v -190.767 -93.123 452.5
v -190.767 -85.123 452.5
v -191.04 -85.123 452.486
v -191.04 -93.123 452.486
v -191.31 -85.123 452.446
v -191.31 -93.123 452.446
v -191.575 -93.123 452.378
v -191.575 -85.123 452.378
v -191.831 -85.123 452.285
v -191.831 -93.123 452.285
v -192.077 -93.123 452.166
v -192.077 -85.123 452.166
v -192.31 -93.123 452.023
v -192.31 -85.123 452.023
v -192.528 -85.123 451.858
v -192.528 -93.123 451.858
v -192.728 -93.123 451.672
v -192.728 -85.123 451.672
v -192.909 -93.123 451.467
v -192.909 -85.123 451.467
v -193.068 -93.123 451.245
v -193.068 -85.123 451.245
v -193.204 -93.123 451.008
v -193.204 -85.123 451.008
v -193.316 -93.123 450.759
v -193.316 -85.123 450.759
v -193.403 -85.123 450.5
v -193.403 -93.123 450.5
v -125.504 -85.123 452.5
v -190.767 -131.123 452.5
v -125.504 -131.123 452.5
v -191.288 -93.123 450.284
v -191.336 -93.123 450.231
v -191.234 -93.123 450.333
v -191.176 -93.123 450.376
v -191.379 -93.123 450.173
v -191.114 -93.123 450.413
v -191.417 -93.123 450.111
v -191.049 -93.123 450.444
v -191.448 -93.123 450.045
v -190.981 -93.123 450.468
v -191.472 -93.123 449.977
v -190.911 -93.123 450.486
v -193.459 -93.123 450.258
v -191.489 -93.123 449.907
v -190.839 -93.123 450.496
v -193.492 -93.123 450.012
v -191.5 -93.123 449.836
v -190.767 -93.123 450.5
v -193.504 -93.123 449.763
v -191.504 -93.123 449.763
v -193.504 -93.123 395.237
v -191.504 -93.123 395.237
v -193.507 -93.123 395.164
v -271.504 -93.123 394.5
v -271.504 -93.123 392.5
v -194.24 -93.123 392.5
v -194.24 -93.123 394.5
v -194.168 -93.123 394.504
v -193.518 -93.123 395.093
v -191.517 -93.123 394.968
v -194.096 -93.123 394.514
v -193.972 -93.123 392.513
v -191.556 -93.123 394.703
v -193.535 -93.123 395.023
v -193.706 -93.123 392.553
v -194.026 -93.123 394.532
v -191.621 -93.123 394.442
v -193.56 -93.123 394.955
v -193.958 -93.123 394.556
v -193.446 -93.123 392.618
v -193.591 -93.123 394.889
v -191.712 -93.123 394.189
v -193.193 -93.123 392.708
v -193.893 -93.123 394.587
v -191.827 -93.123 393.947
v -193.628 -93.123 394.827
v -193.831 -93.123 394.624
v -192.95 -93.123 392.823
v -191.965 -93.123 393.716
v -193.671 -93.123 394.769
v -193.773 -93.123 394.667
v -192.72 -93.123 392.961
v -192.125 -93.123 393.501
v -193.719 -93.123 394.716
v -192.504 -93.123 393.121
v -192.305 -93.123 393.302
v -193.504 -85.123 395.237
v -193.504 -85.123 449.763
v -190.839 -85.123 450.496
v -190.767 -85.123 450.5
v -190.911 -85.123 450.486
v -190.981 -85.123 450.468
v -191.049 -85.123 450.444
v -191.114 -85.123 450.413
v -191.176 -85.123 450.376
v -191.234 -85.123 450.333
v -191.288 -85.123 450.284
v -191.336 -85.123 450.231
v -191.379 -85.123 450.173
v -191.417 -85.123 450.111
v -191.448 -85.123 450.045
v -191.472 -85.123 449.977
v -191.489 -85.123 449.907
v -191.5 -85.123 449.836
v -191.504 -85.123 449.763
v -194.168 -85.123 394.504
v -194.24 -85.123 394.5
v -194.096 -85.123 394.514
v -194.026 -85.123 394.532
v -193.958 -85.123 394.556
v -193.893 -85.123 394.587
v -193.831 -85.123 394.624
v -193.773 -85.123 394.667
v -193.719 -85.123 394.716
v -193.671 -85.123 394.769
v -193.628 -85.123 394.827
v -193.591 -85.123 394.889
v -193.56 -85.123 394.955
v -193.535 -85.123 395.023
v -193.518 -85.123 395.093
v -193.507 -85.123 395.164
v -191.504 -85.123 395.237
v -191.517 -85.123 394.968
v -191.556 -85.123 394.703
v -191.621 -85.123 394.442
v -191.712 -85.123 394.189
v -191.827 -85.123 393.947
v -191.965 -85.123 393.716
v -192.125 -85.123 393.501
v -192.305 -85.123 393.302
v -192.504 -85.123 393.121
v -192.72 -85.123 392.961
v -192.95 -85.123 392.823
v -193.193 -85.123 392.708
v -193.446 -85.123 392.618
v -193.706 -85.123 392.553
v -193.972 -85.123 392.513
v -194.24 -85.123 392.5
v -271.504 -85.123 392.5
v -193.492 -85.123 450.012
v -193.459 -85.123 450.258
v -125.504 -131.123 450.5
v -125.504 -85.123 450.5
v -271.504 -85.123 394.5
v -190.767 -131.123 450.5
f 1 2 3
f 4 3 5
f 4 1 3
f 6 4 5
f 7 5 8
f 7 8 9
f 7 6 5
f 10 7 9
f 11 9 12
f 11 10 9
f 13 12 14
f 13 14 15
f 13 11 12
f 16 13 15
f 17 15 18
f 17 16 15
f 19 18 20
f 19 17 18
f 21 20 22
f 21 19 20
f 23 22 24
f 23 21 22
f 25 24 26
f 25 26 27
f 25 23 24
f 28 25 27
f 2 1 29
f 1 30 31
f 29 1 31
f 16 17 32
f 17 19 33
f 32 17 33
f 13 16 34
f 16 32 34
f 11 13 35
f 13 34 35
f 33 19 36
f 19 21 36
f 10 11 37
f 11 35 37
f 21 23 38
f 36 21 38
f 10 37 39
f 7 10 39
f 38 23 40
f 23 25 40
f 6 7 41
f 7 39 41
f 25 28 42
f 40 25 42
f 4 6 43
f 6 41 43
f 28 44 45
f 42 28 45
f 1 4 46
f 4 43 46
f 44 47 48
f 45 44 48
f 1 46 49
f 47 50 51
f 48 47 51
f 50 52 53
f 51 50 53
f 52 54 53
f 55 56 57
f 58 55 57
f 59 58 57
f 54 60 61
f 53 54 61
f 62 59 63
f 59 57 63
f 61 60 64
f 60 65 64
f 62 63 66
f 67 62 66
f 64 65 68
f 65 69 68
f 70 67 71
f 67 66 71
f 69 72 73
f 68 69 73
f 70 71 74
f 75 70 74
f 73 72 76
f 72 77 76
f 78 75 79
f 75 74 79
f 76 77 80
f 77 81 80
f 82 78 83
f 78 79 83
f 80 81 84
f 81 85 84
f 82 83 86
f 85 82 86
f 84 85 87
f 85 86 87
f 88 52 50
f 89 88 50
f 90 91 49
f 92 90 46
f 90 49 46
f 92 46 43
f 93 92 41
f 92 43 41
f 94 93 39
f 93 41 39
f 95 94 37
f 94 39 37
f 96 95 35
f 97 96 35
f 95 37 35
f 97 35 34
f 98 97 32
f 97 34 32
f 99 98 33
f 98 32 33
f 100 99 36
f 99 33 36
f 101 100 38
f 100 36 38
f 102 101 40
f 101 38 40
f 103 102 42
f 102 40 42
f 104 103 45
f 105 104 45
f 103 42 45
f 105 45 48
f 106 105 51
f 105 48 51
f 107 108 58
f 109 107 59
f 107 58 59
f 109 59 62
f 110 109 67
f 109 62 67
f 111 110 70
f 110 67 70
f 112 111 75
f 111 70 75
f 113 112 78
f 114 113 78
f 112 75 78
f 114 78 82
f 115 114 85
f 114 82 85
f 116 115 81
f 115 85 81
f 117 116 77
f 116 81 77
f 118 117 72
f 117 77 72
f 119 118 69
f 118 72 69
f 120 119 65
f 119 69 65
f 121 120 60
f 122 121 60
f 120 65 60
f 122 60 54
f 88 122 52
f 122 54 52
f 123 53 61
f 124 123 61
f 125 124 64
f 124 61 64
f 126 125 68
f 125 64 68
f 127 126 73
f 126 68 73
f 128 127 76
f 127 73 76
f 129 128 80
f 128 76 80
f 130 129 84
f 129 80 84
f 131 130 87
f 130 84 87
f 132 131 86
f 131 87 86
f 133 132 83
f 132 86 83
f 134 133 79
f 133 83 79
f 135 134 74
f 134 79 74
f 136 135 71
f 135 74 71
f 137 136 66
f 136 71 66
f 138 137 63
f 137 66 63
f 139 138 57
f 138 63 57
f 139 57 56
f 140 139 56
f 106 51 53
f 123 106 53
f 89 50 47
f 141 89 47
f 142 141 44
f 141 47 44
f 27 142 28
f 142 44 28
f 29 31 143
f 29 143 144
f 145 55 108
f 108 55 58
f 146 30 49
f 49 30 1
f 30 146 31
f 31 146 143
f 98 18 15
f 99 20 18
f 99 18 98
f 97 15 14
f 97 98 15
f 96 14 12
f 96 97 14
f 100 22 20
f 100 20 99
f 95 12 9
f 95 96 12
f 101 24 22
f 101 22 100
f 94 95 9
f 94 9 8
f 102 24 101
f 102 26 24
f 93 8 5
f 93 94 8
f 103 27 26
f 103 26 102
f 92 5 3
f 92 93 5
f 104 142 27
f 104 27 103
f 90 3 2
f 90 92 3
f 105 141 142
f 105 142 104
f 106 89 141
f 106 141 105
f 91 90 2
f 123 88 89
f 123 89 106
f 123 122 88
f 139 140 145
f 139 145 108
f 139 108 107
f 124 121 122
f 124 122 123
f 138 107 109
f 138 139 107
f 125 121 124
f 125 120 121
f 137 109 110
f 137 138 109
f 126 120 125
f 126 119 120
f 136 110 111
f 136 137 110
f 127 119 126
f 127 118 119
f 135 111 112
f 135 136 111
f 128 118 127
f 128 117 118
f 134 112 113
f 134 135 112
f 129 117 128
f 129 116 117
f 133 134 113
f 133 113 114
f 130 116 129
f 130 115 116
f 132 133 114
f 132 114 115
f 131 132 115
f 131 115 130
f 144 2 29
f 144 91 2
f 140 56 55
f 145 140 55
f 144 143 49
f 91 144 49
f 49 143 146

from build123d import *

# Parameters (mm, degrees)
CROQUIS1_W                       = 68
CROQUIS1_H                       = 46
BRIDA_BASE1_DEPTH                = 2
BRIDA_DE_ARISTA1_STRIP_W         = 9.4732
BRIDA_DE_ARISTA1_STRIP_H         = 2
BRIDA_DE_ARISTA1_STRIP_CUT_DEPTH = 46
BRIDA_DE_ARISTA1_DEPTH           = 46
BRIDA_DE_ARISTA2_STRIP_W         = 9.4732
BRIDA_DE_ARISTA2_STRIP_H         = 2
BRIDA_DE_ARISTA2_STRIP_CUT_DEPTH = 46
BRIDA_DE_ARISTA2_DEPTH           = 46
DESDOBLAR1_START                 = -131.122521377
DESDOBLAR1_DEPTH                 = 46
DESDOBLAR1_2_DEPTH               = 46
CROQUIS12_W                      = 137.245889802
CROQUIS12_H                      = 38
CORTAR_EXTRUIR1_DEPTH            = 2
DOBLAR1_START                    = -93.122521377
DOBLAR1_DEPTH                    = 8
DOBLAR1_2_DEPTH                  = 8


# Read off the part's stored shape, not the designer's step: Desdoblar1, Doblar1
# Sheet-metal steps are written as plain solids
with BuildPart() as part:
    # Croquis1 → Brida base1 (new body)
    with BuildSketch(Plane.XY.offset(452.5)):
        with Locations((-159.50357094, -108.122521377)):
            Rectangle(CROQUIS1_W, CROQUIS1_H)
    extrude(amount=-BRIDA_BASE1_DEPTH)

    # Brida de arista1 strip (across the edge) → Brida de arista1 strip cut (cut)
    with BuildSketch(Plane(origin=(-193.50357094, -131.122521377, 450.5), x_dir=(1, 0, 0), z_dir=(0, 1, 0))):
        with Locations((-2, -1)):
            Rectangle(BRIDA_DE_ARISTA1_STRIP_W, BRIDA_DE_ARISTA1_STRIP_H)
    extrude(amount=BRIDA_DE_ARISTA1_STRIP_CUT_DEPTH, mode=Mode.SUBTRACT)

    # Brida de arista1 section (across the edge) → Brida de arista1 (add)
    with BuildSketch(Plane(origin=(-193.50357094, -131.122521377, 450.5), x_dir=(1, 0, 0), z_dir=(0, 1, 0))):
        with BuildLine():
            Line((0, 0.7366), (0, 58))
            Line((0, 58), (2, 58))
            Line((2, 58), (2, 0.7366))
            ThreePointArc((2, 0.7366), (2.215745145, 0.215745145), (2.7366, 0))
            Line((2.7366, 0), (2.7366, -2))
            ThreePointArc((2.7366, -2), (0.801531583, -1.198468417), (0, 0.7366))
        make_face()
    extrude(amount=BRIDA_DE_ARISTA1_DEPTH)

    # Brida de arista2 strip (across the edge) → Brida de arista2 strip cut (cut)
    with BuildSketch(Plane(origin=(-193.50357094, -85.122521377, 392.5), x_dir=(0, 0, 1), z_dir=(0, -1, 0))):
        with Locations((-2, -1)):
            Rectangle(BRIDA_DE_ARISTA2_STRIP_W, BRIDA_DE_ARISTA2_STRIP_H)
    extrude(amount=BRIDA_DE_ARISTA2_STRIP_CUT_DEPTH, mode=Mode.SUBTRACT)

    # Brida de arista2 section (across the edge) → Brida de arista2 (add)
    with BuildSketch(Plane(origin=(-193.50357094, -85.122521377, 392.5), x_dir=(0, 0, 1), z_dir=(0, -1, 0))):
        with BuildLine():
            Line((0, 0.7366), (0, 78))
            Line((0, 78), (2, 78))
            Line((2, 78), (2, 0.7366))
            ThreePointArc((2, 0.7366), (2.215745145, 0.215745145), (2.7366, 0))
            Line((2.7366, 0), (2.7366, -2))
            ThreePointArc((2.7366, -2), (0.801531583, -1.198468417), (0, 0.7366))
        make_face()
    extrude(amount=BRIDA_DE_ARISTA2_DEPTH)

    # Desdoblar1 outline → Desdoblar1 (cut)
    with BuildSketch(Plane(origin=(0, 0, 0), x_dir=(1, 0, 0), z_dir=(0, 1, 0)).offset(DESDOBLAR1_START)):
        with BuildLine():
            ThreePointArc((-193.50357094, -449.7634), (-193.478203969, -450.135145906), (-193.402573338, -450.5))
            Line((-193.402573338, -450.5), (-190.76697094, -450.5))
            ThreePointArc((-190.76697094, -450.5), (-191.287825795, -450.284254855), (-191.50357094, -449.7634))
            Line((-191.50357094, -449.7634), (-191.50357094, -395.2366))
            ThreePointArc((-191.50357094, -395.2366), (-192.305102522, -393.301531582), (-194.24017094, -392.5))
            Line((-194.24017094, -392.5), (-271.50357094, -392.5))
            Line((-271.50357094, -392.5), (-271.50357094, -394.5))
            Line((-271.50357094, -394.5), (-194.24017094, -394.5))
            ThreePointArc((-194.24017094, -394.5), (-193.719316085, -394.715745145), (-193.50357094, -395.2366))
            Line((-193.50357094, -395.2366), (-193.50357094, -449.7634))
        make_face()
    extrude(amount=DESDOBLAR1_DEPTH, mode=Mode.SUBTRACT)

    # Desdoblar1 2 outline → Desdoblar1 2 (add)
    with BuildSketch(Plane(origin=(0, 0, 0), x_dir=(1, 0, 0), z_dir=(0, 1, 0)).offset(DESDOBLAR1_START)):
        with BuildLine():
            Line((-328.012860742, -452.5), (-190.76697094, -452.5))
            ThreePointArc((-190.76697094, -452.5), (-192.421238149, -451.943395312), (-193.402573338, -450.5))
            Line((-193.402573338, -450.5), (-328.012860742, -450.5))
            Line((-328.012860742, -450.5), (-328.012860742, -452.5))
        make_face()
    extrude(amount=DESDOBLAR1_2_DEPTH)

    # Croquis12 → Cortar-Extruir1 (cut)
    with BuildSketch(Plane.XY.offset(452.5)):
        with Locations((-259.389915841, -112.122521377)):
            Rectangle(CROQUIS12_W, CROQUIS12_H)
    extrude(amount=-CORTAR_EXTRUIR1_DEPTH, mode=Mode.SUBTRACT)

    # Doblar1 outline → Doblar1 (cut)
    with BuildSketch(Plane(origin=(0, 0, 0), x_dir=(1, 0, 0), z_dir=(0, 1, 0)).offset(DOBLAR1_START)):
        with BuildLine():
            ThreePointArc((-190.76697094, -452.5), (-192.421238149, -451.943395312), (-193.402573338, -450.5))
            Line((-193.402573338, -450.5), (-328.012860742, -450.5))
            Line((-328.012860742, -450.5), (-328.012860742, -452.5))
            Line((-328.012860742, -452.5), (-190.76697094, -452.5))
        make_face()
    extrude(amount=DOBLAR1_DEPTH, mode=Mode.SUBTRACT)

    # Doblar1 2 outline → Doblar1 2 (add)
    with BuildSketch(Plane(origin=(0, 0, 0), x_dir=(1, 0, 0), z_dir=(0, 1, 0)).offset(DOBLAR1_START)):
        with BuildLine():
            Line((-193.50357094, -395.2366), (-193.50357094, -449.7634))
            ThreePointArc((-193.50357094, -449.7634), (-193.478203969, -450.135145906), (-193.402573338, -450.5))
            Line((-193.402573338, -450.5), (-190.76697094, -450.5))
            ThreePointArc((-190.76697094, -450.5), (-191.287825795, -450.284254855), (-191.50357094, -449.7634))
            Line((-191.50357094, -449.7634), (-191.50357094, -395.2366))
            ThreePointArc((-191.50357094, -395.2366), (-192.305102522, -393.301531582), (-194.24017094, -392.5))
            Line((-194.24017094, -392.5), (-271.50357094, -392.5))
            Line((-271.50357094, -392.5), (-271.50357094, -394.5))
            Line((-271.50357094, -394.5), (-194.24017094, -394.5))
            ThreePointArc((-194.24017094, -394.5), (-193.719316085, -394.715745145), (-193.50357094, -395.2366))
        make_face()
    extrude(amount=DOBLAR1_2_DEPTH)


solid = part.part
